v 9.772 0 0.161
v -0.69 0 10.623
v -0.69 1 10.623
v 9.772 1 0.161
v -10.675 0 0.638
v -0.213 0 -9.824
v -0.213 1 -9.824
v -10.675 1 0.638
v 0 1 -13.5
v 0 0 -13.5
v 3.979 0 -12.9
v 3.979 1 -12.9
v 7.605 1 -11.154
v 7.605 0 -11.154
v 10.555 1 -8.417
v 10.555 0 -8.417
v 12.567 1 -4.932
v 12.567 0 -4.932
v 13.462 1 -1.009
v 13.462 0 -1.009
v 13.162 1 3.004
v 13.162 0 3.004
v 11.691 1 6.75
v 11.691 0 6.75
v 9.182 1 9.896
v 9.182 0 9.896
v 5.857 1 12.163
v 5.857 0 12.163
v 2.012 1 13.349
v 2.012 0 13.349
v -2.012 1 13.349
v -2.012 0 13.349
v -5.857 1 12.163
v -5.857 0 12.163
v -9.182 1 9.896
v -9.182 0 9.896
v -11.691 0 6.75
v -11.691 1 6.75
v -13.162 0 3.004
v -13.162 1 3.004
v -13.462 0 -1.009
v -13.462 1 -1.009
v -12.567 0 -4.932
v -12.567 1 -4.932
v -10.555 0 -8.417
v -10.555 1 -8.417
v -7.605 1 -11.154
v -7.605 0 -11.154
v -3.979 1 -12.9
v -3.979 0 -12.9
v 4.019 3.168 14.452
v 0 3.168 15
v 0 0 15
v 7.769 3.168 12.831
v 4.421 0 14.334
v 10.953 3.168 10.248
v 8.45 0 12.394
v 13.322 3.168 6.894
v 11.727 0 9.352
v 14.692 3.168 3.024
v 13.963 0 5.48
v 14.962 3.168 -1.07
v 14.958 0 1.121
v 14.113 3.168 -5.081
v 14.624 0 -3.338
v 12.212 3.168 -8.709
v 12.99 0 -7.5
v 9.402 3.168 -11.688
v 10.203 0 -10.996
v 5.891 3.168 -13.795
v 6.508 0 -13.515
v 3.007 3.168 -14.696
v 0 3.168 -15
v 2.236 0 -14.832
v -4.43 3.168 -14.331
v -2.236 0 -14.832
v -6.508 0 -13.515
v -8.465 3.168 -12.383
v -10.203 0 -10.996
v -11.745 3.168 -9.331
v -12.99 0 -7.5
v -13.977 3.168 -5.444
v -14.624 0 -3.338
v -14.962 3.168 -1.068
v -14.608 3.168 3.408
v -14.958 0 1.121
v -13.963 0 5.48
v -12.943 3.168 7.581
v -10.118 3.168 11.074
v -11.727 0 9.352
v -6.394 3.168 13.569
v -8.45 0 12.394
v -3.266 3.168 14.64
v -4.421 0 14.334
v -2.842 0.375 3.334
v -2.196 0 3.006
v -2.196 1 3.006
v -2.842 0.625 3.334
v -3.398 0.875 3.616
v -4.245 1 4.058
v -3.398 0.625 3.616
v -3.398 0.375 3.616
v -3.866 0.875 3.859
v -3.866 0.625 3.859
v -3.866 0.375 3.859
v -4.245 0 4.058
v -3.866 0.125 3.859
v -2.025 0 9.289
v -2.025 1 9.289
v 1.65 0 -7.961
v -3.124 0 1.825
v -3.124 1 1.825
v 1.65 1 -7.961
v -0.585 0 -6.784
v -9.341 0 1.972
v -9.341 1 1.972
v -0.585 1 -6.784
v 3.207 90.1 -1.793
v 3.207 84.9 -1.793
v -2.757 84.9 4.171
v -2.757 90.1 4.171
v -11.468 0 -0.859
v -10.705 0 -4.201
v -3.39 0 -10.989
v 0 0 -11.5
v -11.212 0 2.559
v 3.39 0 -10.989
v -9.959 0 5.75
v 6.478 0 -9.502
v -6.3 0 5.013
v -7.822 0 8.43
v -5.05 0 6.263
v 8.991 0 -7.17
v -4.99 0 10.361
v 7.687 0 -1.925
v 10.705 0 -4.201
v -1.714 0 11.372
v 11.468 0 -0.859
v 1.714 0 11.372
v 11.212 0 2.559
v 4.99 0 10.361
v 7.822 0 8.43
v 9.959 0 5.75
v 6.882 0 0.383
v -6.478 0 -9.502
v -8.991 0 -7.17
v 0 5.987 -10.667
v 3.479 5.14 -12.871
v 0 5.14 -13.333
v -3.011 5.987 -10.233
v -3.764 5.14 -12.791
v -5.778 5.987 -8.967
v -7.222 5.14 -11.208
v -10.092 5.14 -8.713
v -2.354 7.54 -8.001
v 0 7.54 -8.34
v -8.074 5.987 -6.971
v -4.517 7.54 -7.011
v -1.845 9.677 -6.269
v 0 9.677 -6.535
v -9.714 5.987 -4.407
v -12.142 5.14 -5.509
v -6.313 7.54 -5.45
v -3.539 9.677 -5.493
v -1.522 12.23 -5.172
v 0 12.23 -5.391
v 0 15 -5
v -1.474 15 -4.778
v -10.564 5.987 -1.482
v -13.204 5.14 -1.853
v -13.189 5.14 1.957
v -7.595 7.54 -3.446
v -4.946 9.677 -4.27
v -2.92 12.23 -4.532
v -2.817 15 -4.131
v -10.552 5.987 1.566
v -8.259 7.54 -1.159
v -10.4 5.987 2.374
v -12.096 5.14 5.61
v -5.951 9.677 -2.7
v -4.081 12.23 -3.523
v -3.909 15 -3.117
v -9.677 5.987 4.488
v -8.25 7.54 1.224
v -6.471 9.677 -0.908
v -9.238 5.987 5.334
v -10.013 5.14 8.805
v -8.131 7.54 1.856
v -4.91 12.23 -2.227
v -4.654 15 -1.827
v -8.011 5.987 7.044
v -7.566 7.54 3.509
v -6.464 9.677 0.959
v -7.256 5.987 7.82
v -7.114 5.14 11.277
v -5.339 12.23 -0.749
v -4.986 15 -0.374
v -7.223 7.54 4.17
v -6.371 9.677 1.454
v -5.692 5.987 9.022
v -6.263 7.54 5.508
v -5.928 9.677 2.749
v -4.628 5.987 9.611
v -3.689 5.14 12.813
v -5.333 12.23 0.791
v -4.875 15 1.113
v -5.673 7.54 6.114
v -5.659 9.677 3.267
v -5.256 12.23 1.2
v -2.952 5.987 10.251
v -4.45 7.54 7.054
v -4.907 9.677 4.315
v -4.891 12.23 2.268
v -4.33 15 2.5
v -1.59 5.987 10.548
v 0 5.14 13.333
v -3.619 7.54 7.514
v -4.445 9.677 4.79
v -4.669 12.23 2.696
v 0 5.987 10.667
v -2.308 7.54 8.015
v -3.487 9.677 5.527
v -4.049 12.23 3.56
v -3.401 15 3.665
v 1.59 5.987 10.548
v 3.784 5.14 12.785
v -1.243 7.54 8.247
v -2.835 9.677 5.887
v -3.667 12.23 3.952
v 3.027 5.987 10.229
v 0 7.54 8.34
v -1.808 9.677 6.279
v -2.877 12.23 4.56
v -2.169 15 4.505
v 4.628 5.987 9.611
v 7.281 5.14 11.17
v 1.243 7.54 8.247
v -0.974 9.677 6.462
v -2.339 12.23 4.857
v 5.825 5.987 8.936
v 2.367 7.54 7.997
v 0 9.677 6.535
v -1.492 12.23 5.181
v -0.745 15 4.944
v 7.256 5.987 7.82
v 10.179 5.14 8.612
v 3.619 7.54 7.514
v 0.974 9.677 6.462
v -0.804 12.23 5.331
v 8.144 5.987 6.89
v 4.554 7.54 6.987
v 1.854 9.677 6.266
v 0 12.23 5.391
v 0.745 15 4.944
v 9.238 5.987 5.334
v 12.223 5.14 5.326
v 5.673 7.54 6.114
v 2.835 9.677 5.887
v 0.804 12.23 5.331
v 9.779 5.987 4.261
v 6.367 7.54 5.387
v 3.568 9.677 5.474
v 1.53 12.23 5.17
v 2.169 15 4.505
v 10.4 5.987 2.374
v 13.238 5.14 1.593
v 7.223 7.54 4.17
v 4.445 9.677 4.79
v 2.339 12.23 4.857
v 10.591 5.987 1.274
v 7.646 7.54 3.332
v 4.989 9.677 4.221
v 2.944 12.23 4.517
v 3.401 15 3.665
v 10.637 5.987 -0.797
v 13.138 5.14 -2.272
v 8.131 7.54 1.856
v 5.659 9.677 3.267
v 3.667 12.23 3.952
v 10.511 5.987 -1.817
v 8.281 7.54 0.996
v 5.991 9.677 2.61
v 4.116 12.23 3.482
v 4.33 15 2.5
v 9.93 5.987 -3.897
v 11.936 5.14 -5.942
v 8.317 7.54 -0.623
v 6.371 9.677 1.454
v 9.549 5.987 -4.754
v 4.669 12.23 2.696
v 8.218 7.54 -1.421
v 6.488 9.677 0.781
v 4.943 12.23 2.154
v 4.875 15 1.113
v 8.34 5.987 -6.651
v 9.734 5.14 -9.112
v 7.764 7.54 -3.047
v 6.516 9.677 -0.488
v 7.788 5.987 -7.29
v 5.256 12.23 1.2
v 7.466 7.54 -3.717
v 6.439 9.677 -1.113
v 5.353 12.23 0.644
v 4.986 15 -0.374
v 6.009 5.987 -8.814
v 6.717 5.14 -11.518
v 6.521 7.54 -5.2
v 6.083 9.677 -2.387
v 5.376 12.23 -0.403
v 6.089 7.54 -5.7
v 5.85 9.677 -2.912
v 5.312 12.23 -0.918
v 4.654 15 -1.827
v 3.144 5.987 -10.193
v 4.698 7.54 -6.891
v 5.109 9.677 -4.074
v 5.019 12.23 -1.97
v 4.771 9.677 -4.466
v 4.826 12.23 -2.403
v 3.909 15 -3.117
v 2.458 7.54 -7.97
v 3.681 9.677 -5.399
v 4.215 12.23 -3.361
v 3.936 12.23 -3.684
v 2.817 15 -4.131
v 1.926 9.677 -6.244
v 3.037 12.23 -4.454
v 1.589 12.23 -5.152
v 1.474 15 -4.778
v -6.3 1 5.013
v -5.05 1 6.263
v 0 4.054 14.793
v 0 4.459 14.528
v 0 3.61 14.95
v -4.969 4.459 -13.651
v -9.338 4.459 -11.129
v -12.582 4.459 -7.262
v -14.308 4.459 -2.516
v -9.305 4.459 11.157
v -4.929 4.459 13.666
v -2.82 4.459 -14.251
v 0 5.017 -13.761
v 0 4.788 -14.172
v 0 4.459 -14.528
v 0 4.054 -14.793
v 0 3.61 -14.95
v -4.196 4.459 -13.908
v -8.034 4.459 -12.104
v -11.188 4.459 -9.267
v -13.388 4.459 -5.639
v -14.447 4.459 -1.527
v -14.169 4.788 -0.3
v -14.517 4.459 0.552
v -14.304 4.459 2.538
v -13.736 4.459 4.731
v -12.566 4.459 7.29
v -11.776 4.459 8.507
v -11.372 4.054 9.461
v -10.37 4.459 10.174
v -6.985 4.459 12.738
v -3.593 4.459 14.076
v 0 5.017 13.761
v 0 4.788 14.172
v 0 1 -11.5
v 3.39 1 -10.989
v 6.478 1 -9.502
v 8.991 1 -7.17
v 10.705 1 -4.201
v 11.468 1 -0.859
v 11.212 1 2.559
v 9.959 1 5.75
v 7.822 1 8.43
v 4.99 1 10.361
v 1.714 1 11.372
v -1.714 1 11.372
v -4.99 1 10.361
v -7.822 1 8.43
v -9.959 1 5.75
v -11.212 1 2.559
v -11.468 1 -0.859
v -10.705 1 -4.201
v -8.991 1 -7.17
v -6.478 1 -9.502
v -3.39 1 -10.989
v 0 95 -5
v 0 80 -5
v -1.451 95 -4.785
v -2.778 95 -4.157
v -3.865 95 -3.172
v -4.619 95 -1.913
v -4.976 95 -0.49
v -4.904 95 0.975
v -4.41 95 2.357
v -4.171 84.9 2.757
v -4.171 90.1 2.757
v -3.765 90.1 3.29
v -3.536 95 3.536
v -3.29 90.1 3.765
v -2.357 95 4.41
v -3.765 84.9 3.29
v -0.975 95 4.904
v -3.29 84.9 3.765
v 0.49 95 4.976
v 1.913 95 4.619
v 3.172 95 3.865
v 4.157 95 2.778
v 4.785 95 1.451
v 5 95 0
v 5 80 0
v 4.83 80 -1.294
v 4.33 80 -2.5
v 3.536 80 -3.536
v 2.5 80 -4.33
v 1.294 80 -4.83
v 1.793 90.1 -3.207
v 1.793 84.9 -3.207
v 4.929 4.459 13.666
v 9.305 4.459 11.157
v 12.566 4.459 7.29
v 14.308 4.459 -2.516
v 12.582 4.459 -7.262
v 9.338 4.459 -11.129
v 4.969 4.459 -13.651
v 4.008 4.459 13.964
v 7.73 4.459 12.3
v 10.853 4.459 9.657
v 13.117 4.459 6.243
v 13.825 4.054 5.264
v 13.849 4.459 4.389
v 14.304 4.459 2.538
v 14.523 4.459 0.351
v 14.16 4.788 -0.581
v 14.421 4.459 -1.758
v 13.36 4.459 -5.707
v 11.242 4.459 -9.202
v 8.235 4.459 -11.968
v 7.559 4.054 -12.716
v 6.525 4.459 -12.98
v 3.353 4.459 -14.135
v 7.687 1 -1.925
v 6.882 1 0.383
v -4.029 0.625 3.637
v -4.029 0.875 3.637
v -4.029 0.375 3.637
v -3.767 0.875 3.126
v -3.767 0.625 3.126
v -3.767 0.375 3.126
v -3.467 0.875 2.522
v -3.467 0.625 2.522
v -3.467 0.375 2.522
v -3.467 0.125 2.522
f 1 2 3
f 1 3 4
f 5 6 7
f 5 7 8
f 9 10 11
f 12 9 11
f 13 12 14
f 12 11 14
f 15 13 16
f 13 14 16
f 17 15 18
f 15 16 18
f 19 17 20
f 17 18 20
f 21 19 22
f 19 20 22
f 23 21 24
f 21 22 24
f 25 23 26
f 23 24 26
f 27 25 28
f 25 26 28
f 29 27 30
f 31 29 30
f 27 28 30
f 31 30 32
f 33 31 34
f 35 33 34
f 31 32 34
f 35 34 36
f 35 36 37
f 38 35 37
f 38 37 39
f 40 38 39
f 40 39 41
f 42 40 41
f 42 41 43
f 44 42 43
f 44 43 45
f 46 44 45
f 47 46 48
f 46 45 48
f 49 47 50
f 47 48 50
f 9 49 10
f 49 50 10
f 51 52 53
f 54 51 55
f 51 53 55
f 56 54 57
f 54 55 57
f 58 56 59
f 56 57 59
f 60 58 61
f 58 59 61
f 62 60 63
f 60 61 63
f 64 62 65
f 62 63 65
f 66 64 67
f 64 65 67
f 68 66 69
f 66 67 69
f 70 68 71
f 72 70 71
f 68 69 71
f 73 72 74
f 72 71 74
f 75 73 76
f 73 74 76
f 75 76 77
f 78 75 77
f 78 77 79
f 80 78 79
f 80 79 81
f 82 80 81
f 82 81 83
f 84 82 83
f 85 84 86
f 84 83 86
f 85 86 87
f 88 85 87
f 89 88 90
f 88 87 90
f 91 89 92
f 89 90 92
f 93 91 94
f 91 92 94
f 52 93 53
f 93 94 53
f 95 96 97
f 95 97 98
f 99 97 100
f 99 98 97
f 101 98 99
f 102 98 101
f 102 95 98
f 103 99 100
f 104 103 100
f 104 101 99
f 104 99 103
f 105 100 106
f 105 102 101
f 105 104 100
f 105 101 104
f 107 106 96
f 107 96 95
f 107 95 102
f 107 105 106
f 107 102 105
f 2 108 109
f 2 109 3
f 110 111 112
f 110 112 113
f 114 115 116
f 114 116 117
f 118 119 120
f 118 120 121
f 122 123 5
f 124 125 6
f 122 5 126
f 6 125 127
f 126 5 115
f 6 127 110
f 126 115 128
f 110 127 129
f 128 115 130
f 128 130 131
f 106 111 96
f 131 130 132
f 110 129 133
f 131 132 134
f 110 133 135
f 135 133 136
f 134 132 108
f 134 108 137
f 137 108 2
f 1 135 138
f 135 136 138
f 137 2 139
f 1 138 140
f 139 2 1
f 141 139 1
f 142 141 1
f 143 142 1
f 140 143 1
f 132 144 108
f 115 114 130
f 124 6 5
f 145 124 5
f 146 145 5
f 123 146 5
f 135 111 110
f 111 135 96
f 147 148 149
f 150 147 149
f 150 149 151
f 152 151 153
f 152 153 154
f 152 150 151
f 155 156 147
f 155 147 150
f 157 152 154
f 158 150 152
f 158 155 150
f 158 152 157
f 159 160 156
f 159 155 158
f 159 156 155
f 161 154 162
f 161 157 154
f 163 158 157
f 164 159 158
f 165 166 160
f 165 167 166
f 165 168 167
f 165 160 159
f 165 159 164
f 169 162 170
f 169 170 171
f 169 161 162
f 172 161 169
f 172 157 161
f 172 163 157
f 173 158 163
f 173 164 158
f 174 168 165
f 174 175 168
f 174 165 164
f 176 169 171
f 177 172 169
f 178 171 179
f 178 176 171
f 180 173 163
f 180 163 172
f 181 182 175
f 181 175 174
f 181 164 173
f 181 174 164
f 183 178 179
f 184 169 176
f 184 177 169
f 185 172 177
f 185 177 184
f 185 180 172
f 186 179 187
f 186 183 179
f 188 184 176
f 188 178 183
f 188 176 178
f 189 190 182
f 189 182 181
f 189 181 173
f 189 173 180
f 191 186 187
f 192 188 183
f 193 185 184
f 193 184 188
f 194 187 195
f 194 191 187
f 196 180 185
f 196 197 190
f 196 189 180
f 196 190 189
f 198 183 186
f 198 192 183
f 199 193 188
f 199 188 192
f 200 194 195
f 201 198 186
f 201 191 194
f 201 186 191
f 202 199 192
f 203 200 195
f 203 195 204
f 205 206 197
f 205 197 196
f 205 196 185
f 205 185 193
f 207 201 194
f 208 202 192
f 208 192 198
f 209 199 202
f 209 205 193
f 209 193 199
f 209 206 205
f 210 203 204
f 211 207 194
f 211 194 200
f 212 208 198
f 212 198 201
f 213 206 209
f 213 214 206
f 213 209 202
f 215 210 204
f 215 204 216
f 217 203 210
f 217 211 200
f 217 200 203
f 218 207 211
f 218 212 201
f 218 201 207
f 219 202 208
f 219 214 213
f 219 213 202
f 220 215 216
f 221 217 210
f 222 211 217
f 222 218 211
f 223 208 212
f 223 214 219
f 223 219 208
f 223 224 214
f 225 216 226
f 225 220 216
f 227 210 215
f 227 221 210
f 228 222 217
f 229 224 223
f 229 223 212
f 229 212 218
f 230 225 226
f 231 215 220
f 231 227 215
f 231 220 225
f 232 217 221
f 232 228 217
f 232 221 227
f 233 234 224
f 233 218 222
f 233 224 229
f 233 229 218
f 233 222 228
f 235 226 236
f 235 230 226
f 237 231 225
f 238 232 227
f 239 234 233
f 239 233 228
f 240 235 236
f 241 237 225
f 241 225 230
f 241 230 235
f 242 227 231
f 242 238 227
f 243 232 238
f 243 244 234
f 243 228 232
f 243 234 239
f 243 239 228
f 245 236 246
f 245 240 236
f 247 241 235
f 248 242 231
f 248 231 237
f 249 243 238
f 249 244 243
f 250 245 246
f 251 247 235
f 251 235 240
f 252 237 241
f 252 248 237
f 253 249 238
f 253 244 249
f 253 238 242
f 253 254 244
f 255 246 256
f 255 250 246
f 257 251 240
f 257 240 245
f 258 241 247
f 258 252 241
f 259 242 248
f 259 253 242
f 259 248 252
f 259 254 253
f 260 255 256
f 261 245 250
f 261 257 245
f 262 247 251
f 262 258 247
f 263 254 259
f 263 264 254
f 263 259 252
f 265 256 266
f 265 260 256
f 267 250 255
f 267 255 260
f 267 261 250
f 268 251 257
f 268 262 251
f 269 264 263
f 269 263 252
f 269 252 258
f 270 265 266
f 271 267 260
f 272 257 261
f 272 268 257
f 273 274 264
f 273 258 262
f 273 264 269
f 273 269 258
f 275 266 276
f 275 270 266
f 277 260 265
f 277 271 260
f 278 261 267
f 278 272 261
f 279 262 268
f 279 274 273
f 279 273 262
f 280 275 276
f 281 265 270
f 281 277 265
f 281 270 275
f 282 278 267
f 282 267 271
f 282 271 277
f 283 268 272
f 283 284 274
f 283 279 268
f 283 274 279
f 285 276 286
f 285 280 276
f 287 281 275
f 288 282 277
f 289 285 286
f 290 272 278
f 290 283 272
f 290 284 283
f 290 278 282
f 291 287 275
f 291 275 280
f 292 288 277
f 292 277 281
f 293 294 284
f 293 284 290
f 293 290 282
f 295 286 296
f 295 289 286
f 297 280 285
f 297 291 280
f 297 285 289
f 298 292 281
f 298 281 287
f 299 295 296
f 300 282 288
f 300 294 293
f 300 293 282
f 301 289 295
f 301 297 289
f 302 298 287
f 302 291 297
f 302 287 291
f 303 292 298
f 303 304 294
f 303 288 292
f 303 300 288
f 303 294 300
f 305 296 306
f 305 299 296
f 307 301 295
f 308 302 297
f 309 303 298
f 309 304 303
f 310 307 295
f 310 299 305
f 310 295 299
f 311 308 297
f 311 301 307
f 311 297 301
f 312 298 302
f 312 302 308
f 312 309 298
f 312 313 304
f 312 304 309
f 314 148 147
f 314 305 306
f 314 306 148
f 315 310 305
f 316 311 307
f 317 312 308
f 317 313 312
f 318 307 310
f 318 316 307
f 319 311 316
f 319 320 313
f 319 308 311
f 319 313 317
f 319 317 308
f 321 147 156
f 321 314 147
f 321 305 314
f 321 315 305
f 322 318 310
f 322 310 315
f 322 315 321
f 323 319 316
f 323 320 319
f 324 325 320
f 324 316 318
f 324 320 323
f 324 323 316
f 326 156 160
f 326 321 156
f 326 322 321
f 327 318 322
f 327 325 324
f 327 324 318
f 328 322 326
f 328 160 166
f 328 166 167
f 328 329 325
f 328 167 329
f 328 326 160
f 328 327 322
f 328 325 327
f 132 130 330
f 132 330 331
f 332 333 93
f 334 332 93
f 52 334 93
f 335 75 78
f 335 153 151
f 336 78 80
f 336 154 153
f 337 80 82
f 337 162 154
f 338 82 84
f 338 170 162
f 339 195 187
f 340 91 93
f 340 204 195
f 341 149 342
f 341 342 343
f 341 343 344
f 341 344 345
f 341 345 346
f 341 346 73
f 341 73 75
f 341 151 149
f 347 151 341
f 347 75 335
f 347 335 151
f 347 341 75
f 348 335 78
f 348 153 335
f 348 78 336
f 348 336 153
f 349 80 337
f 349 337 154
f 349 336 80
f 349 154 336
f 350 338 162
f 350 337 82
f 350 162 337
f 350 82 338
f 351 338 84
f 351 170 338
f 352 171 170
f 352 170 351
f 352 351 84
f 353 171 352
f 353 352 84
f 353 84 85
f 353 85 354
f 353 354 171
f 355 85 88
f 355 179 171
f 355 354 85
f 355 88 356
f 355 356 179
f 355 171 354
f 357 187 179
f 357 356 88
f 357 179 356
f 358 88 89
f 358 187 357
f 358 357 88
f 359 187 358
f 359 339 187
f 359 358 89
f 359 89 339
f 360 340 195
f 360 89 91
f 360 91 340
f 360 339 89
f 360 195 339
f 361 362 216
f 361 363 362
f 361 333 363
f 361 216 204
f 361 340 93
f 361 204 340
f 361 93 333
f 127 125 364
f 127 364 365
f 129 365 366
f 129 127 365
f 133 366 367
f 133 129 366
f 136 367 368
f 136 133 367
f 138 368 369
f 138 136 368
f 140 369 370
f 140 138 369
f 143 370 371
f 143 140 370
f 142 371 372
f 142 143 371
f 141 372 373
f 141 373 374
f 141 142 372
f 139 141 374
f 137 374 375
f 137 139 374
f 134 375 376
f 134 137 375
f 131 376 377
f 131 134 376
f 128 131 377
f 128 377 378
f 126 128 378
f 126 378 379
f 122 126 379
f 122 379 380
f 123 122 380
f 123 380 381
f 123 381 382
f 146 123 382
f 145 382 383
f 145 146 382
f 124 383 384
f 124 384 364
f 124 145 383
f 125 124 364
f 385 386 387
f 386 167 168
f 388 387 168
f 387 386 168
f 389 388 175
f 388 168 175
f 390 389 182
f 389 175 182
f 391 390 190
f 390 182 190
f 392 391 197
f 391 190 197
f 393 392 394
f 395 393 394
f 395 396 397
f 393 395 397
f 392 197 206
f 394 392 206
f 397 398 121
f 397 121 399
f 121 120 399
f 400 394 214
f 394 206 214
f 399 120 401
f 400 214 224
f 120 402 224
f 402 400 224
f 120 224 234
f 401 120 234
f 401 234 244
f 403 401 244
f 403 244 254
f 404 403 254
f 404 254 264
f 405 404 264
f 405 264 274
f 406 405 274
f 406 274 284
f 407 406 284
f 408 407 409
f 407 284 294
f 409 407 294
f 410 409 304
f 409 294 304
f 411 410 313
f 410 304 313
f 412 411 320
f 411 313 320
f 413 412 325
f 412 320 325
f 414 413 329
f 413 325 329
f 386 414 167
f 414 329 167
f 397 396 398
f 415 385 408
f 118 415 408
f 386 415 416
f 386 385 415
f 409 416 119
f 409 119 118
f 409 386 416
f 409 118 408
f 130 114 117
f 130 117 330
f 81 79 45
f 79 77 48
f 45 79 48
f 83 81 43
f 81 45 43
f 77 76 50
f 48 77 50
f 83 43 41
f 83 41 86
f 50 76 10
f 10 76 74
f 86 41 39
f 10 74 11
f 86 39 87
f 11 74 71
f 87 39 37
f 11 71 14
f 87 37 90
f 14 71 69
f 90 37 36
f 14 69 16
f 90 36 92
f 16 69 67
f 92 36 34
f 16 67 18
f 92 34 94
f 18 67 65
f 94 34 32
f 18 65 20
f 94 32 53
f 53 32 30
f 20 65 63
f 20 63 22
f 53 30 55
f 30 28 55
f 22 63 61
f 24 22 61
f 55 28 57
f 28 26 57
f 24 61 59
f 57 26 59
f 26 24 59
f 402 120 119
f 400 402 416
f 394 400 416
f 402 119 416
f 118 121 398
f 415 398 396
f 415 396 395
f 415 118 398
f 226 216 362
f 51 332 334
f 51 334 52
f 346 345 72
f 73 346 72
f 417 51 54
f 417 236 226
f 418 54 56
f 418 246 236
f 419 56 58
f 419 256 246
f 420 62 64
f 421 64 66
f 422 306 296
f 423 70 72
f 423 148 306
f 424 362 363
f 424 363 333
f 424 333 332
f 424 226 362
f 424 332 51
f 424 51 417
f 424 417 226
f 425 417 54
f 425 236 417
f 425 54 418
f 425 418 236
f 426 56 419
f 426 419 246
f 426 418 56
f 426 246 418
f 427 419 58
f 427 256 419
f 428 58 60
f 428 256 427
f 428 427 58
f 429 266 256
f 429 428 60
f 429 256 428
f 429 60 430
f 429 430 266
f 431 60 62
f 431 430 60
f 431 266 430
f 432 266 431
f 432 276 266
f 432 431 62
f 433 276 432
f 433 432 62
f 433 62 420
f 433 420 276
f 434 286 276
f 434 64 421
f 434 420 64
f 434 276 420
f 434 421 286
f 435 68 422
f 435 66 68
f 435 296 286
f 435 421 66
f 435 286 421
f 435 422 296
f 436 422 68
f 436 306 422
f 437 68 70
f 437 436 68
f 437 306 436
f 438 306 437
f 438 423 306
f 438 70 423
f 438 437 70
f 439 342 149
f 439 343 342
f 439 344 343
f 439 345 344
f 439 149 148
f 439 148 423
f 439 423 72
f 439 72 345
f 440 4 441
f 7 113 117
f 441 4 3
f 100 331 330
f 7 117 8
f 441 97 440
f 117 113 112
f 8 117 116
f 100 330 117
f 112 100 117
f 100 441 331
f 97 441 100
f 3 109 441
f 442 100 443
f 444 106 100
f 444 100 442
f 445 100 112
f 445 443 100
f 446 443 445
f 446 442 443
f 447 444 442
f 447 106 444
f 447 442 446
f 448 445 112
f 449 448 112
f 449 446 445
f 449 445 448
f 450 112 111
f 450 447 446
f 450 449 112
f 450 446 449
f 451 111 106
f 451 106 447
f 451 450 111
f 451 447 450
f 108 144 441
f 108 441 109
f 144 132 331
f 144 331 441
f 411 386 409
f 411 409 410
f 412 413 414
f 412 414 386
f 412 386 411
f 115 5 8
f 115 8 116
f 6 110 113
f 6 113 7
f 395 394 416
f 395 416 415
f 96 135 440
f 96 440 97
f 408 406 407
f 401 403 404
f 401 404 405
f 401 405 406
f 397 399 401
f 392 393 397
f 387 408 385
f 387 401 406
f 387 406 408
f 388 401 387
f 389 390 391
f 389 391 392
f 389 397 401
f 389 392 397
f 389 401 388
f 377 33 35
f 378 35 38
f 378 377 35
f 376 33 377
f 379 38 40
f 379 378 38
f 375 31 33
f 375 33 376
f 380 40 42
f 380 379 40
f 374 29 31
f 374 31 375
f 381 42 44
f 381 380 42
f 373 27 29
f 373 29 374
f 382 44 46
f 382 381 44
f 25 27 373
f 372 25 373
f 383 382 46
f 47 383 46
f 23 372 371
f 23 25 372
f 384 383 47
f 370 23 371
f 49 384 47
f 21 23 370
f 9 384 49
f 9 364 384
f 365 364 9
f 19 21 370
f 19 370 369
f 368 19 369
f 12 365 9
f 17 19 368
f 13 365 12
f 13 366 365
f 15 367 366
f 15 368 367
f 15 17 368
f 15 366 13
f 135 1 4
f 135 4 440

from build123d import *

# Parameters (mm, degrees)
SKETCH1_R           = 15
BOSS_EXTRUDE1_DEPTH = 5
SKETCH2_R           = 5
BOSS_EXTRUDE2_DEPTH = 90
CUT_EXTRUDE1_START  = -15
CUT_EXTRUDE1_DEPTH  = 15
SKETCH4_W           = 2
SKETCH4_H           = 5.2
CUT_EXTRUDE2_DEPTH  = 99.17076958
FILLET1_R           = 10
FILLET2_R           = 2
CUT_EXTRUDE3_DEPTH  = 1
SKETCH6_R           = 13.5
SKETCH6_R_2         = 11.5
CUT_EXTRUDE4_DEPTH  = 1


with BuildPart() as part:
    # Sketch1 → Boss-Extrude1 (new body)
    with BuildSketch(Plane(origin=(0, 0, 0), x_dir=(1, 0, 0), z_dir=(0, 1, 0))):
        with Locations(Location((0, 0, 0), (0, 0, 270))):
            Circle(SKETCH1_R)
    extrude(amount=BOSS_EXTRUDE1_DEPTH)

    # Sketch2 → Boss-Extrude2 (add)
    with BuildSketch(Plane(origin=(0, 5, 0), x_dir=(1, 0, 0), z_dir=(0, 1, 0))):
        with Locations(Location((0, 0, 0), (0, 0, 90))):
            Circle(SKETCH2_R)
    extrude(amount=BOSS_EXTRUDE2_DEPTH)

    # Sketch3 → Cut-Extrude1 (cut)
    with BuildSketch(Plane(origin=(0, 95, 0), x_dir=(1, 0, 0), z_dir=(0, 1, 0)).offset(CUT_EXTRUDE1_START)):
        with BuildLine():
            Line((0, 5), (5, 0))
            ThreePointArc((5, 0), (3.535533906, 3.535533906), (0, 5))
        make_face()
    extrude(amount=CUT_EXTRUDE1_DEPTH, mode=Mode.SUBTRACT)

    # Sketch4 → Cut-Extrude2 (cut, through all)
    with BuildSketch(Plane(origin=(2.5, 0, -2.5), x_dir=(-0.7071067811865475, 0, -0.7071067811865477), z_dir=(0.7071067811865477, 0, -0.7071067811865475))):
        with Locations((0, 87.5)):
            Rectangle(SKETCH4_W, SKETCH4_H)
    extrude(amount=-CUT_EXTRUDE2_DEPTH, mode=Mode.SUBTRACT)

    # Fillet1
    fillet1_edges = [part.edges().sort_by_distance(p)[0] for p in [
        (0, 5, 5),
    ]]
    fillet(fillet1_edges, radius=FILLET1_R - 0.0001)  # a hair under: the kernel refuses the full size

    # Fillet2
    fillet2_edges = [part.edges().sort_by_distance(p)[0] for p in [
        (0, 5, -15),
    ]]
    fillet(fillet2_edges, radius=FILLET2_R)

    # Sketch5 → Cut-Extrude3 (cut)
    with BuildSketch(Plane.XZ):
        with BuildLine():
            Line((-0.690387564, 10.623320935), (9.77235282, 0.16058055))
            Line((9.77235282, 0.16058055), (7.687016282, -1.924755988))
            Line((7.687016282, -1.924755988), (-2.195796218, 3.006133435))
            add(Edge.make_bspline(
                [(-2.195796218, 3.006133435), (-2.307029511, 3.062113904), (-2.52269645, 3.170652781), (-2.833890677, 3.329506222), (-3.122930247, 3.477577181), (-3.391022331, 3.612480856), (-3.636978399, 3.737620248), (-3.85910859, 3.856159494), (-4.059958905, 3.960316417), (-4.186011343, 4.026707574), (-4.245075064, 4.057816127)],
                knots=[0, 0, 0, 0, 1.297460102, 2.515607, 3.640415016, 4.681187102, 5.642653462, 6.515599393, 7.304462283, 8, 8, 8, 8], degree=3))
            add(Edge.make_bspline(
                [(-4.245075064, 4.057816127), (-4.210973718, 3.991734504), (-4.138662994, 3.851610709), (-4.025441526, 3.629760807), (-3.897989309, 3.38652834), (-3.762956902, 3.118983989), (-3.620144132, 2.827316511), (-3.462218864, 2.515142559), (-3.297896109, 2.177641474), (-3.18347293, 1.945388515), (-3.124281795, 1.825244012)],
                knots=[0, 0, 0, 0, 0.714390188, 1.514839662, 2.392796159, 3.352429004, 4.393822708, 5.512665897, 6.71330155, 8, 8, 8, 8], degree=3))
            Line((-3.124281795, 1.825244012), (1.650357628, -7.961414642))
            Line((1.650357628, -7.961414642), (-0.212623141, -9.824395412))
            Line((-0.212623141, -9.824395412), (-10.675363526, 0.638344973))
            Line((-10.675363526, 0.638344973), (-9.34122891, 1.972479588))
            Line((-9.34122891, 1.972479588), (-0.585219295, -6.783530027))
            Line((-0.585219295, -6.783530027), (-6.300363526, 5.013344973))
            Line((-6.300363526, 5.013344973), (-5.050363526, 6.263344973))
            Line((-5.050363526, 6.263344973), (6.88172782, 0.382936319))
            Line((6.88172782, 0.382936319), (-2.02452218, 9.289186319))
            Line((-2.02452218, 9.289186319), (-0.690387564, 10.623320935))
        make_face()
    extrude(amount=-CUT_EXTRUDE3_DEPTH, mode=Mode.SUBTRACT)

    # Sketch6 → Cut-Extrude4 (cut)
    with BuildSketch(Plane.XZ):
        with Locations(Location((0, 0, 0), (0, 0, 270))):
            Circle(SKETCH6_R)
        with Locations(Location((0, 0, 0), (0, 0, 270))):
            Circle(SKETCH6_R_2, mode=Mode.SUBTRACT)
    extrude(amount=-CUT_EXTRUDE4_DEPTH, mode=Mode.SUBTRACT)


solid = part.part
